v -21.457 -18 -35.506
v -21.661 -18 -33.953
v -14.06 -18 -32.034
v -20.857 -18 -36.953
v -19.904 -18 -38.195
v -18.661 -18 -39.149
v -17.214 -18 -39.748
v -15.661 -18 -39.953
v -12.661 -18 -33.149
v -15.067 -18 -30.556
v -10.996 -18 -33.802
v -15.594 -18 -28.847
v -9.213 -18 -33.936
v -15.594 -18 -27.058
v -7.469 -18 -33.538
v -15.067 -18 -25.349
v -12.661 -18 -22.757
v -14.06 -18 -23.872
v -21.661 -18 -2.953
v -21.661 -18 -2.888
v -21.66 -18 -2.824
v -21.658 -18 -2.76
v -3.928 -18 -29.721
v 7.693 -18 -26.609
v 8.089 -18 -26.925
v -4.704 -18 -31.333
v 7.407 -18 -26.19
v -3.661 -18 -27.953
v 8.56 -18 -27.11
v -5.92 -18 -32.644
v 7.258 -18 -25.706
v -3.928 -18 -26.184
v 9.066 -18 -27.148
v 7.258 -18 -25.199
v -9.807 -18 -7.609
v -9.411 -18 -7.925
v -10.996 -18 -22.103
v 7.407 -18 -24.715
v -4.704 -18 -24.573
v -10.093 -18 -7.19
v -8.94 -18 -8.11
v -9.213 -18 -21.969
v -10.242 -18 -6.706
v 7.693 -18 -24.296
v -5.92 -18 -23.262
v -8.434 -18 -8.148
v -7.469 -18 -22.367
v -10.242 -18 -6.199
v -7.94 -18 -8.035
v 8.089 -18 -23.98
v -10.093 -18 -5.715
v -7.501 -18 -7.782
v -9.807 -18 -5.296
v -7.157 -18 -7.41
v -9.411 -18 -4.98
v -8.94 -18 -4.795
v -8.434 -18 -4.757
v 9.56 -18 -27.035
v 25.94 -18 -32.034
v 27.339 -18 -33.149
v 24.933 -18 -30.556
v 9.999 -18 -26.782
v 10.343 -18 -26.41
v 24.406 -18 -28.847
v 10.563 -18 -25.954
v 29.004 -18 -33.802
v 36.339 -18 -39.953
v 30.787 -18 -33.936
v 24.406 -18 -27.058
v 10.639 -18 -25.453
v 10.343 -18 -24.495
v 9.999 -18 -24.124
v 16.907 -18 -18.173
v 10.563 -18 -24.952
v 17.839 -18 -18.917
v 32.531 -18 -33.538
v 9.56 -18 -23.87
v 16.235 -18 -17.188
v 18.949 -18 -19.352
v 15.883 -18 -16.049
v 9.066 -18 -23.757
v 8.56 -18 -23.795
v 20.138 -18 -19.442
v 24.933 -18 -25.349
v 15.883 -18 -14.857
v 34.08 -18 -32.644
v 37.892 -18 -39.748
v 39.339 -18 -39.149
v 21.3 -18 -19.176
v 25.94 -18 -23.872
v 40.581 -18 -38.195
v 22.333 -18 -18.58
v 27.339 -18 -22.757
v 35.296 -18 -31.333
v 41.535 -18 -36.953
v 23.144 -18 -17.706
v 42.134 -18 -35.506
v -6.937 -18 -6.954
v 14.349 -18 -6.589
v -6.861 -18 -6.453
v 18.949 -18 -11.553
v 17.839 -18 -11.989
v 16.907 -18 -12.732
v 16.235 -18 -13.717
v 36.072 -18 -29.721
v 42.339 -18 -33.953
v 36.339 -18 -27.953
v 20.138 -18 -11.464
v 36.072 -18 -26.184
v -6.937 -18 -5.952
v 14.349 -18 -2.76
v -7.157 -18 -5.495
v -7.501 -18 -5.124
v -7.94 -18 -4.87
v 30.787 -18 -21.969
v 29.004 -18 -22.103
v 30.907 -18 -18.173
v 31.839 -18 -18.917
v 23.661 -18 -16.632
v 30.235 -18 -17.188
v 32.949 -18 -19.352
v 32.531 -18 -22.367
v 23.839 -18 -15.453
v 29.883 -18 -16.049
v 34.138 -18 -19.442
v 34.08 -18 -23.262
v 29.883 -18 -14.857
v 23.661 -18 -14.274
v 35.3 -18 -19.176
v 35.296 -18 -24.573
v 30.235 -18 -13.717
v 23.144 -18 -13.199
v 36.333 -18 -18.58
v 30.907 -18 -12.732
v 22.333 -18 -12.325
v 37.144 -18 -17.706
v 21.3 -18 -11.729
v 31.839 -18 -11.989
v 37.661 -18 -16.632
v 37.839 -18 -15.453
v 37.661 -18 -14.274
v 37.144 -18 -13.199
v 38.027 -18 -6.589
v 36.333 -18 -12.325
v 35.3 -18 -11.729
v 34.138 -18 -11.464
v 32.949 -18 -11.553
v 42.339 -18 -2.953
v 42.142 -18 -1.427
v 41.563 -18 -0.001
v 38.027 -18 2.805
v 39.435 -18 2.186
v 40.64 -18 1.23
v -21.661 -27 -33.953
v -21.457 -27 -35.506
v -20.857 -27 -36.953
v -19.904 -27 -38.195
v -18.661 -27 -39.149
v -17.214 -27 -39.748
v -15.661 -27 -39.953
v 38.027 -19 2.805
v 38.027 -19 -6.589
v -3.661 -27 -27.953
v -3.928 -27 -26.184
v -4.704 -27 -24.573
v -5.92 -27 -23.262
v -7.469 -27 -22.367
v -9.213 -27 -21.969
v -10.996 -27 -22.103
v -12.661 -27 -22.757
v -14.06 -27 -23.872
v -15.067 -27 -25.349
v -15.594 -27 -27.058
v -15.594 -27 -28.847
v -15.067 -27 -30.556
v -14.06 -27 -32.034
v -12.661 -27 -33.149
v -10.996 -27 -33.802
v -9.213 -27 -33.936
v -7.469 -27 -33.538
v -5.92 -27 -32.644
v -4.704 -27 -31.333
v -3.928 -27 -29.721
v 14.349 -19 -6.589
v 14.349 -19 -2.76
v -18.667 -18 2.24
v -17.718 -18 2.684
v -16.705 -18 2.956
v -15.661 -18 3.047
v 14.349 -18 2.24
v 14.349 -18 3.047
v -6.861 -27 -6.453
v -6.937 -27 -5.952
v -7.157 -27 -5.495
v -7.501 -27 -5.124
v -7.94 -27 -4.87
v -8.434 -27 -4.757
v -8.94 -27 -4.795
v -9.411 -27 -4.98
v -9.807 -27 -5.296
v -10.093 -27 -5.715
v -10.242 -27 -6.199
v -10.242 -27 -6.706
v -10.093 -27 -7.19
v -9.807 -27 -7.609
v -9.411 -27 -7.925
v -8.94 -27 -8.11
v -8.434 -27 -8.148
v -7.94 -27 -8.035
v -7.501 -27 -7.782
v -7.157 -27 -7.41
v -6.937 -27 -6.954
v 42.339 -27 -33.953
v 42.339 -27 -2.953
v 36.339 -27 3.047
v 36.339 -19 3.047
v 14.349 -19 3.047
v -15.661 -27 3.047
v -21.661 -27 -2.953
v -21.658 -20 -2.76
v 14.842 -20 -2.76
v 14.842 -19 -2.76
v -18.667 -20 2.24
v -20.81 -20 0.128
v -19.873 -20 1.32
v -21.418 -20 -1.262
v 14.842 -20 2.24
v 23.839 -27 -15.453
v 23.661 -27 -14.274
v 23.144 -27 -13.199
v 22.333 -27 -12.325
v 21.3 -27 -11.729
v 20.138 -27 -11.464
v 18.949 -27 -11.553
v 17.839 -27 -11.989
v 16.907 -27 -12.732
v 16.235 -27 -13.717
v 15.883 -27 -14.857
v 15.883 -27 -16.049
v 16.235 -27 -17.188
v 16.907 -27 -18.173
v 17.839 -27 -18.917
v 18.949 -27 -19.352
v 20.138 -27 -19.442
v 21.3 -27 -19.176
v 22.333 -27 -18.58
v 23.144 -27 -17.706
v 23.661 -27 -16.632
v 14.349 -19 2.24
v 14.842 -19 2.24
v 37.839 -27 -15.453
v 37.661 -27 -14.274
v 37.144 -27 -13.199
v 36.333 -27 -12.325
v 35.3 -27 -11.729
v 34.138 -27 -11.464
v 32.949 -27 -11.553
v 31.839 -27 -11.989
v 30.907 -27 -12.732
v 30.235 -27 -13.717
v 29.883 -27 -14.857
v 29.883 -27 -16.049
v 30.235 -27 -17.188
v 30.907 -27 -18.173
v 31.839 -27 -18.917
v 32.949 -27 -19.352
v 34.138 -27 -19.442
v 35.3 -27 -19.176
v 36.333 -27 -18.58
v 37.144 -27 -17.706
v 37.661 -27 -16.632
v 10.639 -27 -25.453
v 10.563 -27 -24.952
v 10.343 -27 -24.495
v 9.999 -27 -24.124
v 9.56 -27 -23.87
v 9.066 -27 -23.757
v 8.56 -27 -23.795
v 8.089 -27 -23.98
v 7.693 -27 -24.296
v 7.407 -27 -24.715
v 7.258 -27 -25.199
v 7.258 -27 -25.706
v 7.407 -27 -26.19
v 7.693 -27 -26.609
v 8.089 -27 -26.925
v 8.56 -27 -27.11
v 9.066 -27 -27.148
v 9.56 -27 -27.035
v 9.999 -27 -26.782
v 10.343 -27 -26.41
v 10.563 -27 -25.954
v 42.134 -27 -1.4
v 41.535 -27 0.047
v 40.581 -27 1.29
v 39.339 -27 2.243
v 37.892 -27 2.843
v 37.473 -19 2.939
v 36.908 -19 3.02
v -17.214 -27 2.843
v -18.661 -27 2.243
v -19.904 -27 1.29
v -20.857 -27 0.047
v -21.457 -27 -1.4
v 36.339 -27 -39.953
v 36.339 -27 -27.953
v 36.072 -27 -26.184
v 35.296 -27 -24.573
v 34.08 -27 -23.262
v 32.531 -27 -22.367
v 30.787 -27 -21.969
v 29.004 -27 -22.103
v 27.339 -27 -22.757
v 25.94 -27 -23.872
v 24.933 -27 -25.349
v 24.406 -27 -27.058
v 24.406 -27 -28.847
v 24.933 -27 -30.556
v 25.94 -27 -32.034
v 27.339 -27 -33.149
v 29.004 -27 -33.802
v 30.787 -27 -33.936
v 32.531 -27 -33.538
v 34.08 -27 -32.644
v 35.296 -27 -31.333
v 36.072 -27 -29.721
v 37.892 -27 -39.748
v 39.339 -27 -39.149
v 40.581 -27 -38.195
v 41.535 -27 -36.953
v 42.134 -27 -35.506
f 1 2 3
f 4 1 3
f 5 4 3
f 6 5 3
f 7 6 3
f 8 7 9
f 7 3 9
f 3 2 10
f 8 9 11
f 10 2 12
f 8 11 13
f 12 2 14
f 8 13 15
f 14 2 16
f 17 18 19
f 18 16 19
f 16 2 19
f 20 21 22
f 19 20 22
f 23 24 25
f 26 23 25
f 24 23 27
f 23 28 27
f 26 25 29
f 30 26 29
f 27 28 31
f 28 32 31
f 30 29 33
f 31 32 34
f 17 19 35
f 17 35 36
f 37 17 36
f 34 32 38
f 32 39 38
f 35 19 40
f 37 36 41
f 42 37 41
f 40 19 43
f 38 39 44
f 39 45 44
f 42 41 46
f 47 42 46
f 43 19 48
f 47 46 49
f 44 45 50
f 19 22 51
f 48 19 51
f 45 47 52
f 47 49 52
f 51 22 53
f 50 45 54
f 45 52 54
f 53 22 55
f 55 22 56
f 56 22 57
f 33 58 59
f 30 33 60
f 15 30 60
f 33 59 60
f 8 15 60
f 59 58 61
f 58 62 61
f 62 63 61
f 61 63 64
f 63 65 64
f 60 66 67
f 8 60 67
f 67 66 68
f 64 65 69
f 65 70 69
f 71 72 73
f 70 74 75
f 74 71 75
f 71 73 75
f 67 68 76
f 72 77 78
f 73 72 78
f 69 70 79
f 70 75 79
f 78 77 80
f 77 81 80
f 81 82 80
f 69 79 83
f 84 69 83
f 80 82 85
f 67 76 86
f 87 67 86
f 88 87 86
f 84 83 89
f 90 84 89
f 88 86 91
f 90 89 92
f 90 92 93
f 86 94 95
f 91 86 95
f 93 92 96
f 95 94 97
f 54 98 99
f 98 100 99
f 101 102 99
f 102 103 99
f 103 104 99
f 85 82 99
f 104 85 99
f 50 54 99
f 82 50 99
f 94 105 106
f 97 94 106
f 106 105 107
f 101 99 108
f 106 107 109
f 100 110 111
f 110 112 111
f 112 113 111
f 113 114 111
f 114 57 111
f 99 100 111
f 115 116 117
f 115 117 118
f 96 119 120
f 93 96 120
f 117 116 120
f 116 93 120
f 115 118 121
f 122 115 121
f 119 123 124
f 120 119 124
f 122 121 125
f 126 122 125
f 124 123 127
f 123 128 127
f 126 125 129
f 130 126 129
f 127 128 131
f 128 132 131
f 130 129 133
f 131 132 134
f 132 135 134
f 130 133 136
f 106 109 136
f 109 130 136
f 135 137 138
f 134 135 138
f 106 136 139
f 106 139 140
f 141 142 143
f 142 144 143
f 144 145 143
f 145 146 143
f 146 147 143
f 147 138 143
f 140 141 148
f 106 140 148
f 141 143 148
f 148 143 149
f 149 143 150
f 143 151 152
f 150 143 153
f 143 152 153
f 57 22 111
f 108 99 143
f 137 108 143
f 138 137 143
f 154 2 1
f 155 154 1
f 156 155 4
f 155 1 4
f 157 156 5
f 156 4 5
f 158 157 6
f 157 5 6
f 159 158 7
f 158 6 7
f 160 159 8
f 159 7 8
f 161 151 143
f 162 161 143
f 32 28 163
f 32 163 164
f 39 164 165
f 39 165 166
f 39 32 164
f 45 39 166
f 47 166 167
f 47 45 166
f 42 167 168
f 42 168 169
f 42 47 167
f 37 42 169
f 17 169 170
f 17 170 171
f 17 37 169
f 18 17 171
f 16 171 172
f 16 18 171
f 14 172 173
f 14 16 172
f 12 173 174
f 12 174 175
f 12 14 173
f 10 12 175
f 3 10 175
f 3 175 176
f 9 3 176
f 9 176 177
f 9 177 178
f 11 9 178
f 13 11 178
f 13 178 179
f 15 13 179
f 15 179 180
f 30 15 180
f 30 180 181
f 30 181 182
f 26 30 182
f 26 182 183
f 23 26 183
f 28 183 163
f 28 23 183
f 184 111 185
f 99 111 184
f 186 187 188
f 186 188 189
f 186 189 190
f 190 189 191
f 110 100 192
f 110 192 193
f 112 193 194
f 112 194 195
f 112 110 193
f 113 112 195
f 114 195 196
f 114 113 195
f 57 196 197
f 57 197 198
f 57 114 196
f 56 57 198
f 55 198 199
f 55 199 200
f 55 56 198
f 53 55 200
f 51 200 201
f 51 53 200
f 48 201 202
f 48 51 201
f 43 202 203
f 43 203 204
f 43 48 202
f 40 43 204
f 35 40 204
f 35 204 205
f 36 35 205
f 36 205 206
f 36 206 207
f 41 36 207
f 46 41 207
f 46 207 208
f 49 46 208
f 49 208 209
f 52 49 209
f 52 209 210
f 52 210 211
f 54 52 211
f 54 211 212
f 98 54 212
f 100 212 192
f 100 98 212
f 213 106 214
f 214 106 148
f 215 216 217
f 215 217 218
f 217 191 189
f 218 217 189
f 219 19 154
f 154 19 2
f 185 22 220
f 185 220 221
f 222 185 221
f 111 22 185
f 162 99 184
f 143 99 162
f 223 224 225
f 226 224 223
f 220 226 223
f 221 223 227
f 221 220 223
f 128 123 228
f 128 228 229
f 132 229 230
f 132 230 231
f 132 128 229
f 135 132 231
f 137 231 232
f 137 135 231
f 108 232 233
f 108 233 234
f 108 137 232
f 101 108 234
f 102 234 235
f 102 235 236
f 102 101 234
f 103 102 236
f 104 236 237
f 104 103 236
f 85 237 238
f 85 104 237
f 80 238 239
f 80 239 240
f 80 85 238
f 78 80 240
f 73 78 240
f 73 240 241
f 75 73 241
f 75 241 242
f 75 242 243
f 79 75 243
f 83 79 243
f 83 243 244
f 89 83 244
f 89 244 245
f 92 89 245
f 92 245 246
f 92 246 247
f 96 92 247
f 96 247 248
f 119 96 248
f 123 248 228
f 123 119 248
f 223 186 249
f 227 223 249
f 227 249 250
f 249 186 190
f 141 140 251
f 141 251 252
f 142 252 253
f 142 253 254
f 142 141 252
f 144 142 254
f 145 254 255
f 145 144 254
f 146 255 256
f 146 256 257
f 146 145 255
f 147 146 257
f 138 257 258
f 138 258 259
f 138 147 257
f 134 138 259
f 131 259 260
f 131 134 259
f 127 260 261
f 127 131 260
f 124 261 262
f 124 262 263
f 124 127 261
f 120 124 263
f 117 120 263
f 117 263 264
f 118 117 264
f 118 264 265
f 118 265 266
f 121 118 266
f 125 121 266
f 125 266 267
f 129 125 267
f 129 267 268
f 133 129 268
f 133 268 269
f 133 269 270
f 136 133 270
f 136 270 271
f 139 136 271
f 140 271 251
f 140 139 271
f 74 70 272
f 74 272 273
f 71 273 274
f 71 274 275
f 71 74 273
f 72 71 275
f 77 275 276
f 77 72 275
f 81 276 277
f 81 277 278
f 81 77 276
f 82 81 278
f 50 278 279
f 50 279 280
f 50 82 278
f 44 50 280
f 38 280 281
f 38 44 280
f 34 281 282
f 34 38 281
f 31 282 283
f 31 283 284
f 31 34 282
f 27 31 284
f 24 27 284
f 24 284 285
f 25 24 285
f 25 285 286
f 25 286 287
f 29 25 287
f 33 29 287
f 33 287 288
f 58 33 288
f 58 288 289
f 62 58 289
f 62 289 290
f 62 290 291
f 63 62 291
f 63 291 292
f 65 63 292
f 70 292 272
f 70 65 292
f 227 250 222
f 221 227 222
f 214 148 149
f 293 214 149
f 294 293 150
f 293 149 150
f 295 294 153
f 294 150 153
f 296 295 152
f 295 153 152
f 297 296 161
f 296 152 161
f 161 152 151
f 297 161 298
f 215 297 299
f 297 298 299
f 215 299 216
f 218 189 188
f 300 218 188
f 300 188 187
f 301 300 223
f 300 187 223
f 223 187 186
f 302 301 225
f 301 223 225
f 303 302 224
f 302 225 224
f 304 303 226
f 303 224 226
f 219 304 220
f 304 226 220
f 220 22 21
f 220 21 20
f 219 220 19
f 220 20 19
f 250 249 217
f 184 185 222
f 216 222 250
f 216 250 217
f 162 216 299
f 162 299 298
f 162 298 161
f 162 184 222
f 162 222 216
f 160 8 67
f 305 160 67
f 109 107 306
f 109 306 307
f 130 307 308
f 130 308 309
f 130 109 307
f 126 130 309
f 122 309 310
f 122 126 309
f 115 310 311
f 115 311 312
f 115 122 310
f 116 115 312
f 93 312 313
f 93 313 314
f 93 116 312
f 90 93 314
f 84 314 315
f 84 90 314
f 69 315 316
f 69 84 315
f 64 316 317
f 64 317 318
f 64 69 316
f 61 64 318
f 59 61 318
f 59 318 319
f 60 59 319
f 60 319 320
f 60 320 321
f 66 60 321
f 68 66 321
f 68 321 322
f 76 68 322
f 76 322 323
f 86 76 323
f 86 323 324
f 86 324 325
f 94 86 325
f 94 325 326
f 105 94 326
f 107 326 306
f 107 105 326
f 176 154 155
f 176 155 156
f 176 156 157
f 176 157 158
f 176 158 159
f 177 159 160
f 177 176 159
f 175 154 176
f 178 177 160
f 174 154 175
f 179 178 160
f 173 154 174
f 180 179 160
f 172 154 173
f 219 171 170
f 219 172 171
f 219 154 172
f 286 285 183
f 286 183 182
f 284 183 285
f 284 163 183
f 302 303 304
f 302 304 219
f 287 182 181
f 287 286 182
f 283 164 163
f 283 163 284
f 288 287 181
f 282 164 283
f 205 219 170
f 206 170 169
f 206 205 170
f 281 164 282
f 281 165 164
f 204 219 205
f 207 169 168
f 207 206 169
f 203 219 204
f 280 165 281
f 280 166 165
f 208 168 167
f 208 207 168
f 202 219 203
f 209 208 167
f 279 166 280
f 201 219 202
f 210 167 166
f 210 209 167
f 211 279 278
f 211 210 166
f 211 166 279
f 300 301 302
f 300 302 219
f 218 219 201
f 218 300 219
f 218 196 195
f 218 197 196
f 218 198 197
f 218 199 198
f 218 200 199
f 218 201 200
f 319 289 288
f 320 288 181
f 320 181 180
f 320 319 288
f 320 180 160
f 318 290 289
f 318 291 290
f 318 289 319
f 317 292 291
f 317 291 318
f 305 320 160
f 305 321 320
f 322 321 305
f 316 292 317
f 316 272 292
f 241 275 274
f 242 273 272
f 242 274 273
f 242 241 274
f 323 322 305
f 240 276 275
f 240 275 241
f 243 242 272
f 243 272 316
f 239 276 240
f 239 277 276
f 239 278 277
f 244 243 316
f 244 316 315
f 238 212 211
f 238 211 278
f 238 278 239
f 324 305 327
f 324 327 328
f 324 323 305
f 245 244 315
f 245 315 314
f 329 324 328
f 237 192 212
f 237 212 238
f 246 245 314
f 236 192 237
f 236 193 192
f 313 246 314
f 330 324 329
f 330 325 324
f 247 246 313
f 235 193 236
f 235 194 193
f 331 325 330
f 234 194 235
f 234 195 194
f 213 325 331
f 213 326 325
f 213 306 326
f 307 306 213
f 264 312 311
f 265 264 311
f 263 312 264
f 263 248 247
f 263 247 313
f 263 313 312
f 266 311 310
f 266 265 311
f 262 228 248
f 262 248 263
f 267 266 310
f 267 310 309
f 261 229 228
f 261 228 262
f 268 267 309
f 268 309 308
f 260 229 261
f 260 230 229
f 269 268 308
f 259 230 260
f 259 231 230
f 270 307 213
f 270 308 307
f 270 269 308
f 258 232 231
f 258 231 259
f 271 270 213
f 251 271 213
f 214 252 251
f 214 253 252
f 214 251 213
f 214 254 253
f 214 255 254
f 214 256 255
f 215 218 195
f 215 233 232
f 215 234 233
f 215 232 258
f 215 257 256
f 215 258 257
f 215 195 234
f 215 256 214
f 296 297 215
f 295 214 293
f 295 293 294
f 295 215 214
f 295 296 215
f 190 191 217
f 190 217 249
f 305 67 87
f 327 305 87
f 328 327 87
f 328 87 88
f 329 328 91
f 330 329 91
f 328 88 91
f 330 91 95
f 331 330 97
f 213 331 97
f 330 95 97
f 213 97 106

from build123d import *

# Parameters (mm, degrees)
SKETCH034_R     = 6
SKETCH034_R_2   = 4
SKETCH034_R_3   = 1.7
PAD010_DEPTH    = 9
SKETCH035_W     = 23.67814
SKETCH035_H     = 16.3581
POCKET022_DEPTH = 1
SKETCH036_W     = 37.866951
SKETCH036_H     = 5
POCKET023_DEPTH = 2


with BuildPart() as part:
    # Sketch034 → Pad010 (new body)
    with BuildSketch(Plane.XZ):
        with BuildLine():
            Line((38.838751, 1.547306), (-13.161249, 1.547306))
            ThreePointArc((-13.161249, 1.547306), (-17.40389, -0.210054), (-19.161249, -4.452694))
            Line((-19.161249, -4.452694), (-19.161249, -35.452694))
            ThreePointArc((-19.161249, -35.452694), (-17.40389, -39.695335), (-13.161249, -41.452694))
            Line((-13.161249, -41.452694), (38.838751, -41.452694))
            ThreePointArc((38.838751, -41.452694), (43.081392, -39.695335), (44.838751, -35.452694))
            Line((44.838751, -35.452694), (44.838751, -4.452694))
            ThreePointArc((44.838751, -4.452694), (43.081392, -0.210054), (38.838751, 1.547306))
        make_face()
        with Locations((32.838751, -29.452694)):
            Circle(SKETCH034_R, mode=Mode.SUBTRACT)
        with Locations((-7.161249, -29.452694)):
            Circle(SKETCH034_R, mode=Mode.SUBTRACT)
        with Locations((22.338751, -16.952694)):
            Circle(SKETCH034_R_2, mode=Mode.SUBTRACT)
        with Locations((36.338751, -16.952694)):
            Circle(SKETCH034_R_2, mode=Mode.SUBTRACT)
        with Locations((11.438751, -26.952694)):
            Circle(SKETCH034_R_3, mode=Mode.SUBTRACT)
        with Locations((-6.061249, -7.952694)):
            Circle(SKETCH034_R_3, mode=Mode.SUBTRACT)
    extrude(amount=PAD010_DEPTH)

    # Sketch035 (on Face15 of Pad010) → Pocket022 (cut)
    with BuildSketch(Plane(origin=(0, 0, 0), x_dir=(1, 0, 0), z_dir=(0, 1, 0))):
        with Locations((28.687662, -0.089719)):
            Rectangle(SKETCH035_W, SKETCH035_H)
    extrude(amount=-POCKET022_DEPTH, mode=Mode.SUBTRACT)

    # Sketch036 (on Face4 of Pocket022) → Pocket023 (cut)
    with BuildSketch(Plane(origin=(0, 0, 0), x_dir=(1, 0, 0), z_dir=(0, 1, 0))):
        with Locations((-1.591031, 1.759919)):
            Rectangle(SKETCH036_W, SKETCH036_H)
    extrude(amount=-POCKET023_DEPTH, mode=Mode.SUBTRACT)


with BuildPart() as part_1:
    # Body004 placement: moved
    add(part.part.moved(Location((-2.5, -18, 1.5))))


solid = part_1.part
